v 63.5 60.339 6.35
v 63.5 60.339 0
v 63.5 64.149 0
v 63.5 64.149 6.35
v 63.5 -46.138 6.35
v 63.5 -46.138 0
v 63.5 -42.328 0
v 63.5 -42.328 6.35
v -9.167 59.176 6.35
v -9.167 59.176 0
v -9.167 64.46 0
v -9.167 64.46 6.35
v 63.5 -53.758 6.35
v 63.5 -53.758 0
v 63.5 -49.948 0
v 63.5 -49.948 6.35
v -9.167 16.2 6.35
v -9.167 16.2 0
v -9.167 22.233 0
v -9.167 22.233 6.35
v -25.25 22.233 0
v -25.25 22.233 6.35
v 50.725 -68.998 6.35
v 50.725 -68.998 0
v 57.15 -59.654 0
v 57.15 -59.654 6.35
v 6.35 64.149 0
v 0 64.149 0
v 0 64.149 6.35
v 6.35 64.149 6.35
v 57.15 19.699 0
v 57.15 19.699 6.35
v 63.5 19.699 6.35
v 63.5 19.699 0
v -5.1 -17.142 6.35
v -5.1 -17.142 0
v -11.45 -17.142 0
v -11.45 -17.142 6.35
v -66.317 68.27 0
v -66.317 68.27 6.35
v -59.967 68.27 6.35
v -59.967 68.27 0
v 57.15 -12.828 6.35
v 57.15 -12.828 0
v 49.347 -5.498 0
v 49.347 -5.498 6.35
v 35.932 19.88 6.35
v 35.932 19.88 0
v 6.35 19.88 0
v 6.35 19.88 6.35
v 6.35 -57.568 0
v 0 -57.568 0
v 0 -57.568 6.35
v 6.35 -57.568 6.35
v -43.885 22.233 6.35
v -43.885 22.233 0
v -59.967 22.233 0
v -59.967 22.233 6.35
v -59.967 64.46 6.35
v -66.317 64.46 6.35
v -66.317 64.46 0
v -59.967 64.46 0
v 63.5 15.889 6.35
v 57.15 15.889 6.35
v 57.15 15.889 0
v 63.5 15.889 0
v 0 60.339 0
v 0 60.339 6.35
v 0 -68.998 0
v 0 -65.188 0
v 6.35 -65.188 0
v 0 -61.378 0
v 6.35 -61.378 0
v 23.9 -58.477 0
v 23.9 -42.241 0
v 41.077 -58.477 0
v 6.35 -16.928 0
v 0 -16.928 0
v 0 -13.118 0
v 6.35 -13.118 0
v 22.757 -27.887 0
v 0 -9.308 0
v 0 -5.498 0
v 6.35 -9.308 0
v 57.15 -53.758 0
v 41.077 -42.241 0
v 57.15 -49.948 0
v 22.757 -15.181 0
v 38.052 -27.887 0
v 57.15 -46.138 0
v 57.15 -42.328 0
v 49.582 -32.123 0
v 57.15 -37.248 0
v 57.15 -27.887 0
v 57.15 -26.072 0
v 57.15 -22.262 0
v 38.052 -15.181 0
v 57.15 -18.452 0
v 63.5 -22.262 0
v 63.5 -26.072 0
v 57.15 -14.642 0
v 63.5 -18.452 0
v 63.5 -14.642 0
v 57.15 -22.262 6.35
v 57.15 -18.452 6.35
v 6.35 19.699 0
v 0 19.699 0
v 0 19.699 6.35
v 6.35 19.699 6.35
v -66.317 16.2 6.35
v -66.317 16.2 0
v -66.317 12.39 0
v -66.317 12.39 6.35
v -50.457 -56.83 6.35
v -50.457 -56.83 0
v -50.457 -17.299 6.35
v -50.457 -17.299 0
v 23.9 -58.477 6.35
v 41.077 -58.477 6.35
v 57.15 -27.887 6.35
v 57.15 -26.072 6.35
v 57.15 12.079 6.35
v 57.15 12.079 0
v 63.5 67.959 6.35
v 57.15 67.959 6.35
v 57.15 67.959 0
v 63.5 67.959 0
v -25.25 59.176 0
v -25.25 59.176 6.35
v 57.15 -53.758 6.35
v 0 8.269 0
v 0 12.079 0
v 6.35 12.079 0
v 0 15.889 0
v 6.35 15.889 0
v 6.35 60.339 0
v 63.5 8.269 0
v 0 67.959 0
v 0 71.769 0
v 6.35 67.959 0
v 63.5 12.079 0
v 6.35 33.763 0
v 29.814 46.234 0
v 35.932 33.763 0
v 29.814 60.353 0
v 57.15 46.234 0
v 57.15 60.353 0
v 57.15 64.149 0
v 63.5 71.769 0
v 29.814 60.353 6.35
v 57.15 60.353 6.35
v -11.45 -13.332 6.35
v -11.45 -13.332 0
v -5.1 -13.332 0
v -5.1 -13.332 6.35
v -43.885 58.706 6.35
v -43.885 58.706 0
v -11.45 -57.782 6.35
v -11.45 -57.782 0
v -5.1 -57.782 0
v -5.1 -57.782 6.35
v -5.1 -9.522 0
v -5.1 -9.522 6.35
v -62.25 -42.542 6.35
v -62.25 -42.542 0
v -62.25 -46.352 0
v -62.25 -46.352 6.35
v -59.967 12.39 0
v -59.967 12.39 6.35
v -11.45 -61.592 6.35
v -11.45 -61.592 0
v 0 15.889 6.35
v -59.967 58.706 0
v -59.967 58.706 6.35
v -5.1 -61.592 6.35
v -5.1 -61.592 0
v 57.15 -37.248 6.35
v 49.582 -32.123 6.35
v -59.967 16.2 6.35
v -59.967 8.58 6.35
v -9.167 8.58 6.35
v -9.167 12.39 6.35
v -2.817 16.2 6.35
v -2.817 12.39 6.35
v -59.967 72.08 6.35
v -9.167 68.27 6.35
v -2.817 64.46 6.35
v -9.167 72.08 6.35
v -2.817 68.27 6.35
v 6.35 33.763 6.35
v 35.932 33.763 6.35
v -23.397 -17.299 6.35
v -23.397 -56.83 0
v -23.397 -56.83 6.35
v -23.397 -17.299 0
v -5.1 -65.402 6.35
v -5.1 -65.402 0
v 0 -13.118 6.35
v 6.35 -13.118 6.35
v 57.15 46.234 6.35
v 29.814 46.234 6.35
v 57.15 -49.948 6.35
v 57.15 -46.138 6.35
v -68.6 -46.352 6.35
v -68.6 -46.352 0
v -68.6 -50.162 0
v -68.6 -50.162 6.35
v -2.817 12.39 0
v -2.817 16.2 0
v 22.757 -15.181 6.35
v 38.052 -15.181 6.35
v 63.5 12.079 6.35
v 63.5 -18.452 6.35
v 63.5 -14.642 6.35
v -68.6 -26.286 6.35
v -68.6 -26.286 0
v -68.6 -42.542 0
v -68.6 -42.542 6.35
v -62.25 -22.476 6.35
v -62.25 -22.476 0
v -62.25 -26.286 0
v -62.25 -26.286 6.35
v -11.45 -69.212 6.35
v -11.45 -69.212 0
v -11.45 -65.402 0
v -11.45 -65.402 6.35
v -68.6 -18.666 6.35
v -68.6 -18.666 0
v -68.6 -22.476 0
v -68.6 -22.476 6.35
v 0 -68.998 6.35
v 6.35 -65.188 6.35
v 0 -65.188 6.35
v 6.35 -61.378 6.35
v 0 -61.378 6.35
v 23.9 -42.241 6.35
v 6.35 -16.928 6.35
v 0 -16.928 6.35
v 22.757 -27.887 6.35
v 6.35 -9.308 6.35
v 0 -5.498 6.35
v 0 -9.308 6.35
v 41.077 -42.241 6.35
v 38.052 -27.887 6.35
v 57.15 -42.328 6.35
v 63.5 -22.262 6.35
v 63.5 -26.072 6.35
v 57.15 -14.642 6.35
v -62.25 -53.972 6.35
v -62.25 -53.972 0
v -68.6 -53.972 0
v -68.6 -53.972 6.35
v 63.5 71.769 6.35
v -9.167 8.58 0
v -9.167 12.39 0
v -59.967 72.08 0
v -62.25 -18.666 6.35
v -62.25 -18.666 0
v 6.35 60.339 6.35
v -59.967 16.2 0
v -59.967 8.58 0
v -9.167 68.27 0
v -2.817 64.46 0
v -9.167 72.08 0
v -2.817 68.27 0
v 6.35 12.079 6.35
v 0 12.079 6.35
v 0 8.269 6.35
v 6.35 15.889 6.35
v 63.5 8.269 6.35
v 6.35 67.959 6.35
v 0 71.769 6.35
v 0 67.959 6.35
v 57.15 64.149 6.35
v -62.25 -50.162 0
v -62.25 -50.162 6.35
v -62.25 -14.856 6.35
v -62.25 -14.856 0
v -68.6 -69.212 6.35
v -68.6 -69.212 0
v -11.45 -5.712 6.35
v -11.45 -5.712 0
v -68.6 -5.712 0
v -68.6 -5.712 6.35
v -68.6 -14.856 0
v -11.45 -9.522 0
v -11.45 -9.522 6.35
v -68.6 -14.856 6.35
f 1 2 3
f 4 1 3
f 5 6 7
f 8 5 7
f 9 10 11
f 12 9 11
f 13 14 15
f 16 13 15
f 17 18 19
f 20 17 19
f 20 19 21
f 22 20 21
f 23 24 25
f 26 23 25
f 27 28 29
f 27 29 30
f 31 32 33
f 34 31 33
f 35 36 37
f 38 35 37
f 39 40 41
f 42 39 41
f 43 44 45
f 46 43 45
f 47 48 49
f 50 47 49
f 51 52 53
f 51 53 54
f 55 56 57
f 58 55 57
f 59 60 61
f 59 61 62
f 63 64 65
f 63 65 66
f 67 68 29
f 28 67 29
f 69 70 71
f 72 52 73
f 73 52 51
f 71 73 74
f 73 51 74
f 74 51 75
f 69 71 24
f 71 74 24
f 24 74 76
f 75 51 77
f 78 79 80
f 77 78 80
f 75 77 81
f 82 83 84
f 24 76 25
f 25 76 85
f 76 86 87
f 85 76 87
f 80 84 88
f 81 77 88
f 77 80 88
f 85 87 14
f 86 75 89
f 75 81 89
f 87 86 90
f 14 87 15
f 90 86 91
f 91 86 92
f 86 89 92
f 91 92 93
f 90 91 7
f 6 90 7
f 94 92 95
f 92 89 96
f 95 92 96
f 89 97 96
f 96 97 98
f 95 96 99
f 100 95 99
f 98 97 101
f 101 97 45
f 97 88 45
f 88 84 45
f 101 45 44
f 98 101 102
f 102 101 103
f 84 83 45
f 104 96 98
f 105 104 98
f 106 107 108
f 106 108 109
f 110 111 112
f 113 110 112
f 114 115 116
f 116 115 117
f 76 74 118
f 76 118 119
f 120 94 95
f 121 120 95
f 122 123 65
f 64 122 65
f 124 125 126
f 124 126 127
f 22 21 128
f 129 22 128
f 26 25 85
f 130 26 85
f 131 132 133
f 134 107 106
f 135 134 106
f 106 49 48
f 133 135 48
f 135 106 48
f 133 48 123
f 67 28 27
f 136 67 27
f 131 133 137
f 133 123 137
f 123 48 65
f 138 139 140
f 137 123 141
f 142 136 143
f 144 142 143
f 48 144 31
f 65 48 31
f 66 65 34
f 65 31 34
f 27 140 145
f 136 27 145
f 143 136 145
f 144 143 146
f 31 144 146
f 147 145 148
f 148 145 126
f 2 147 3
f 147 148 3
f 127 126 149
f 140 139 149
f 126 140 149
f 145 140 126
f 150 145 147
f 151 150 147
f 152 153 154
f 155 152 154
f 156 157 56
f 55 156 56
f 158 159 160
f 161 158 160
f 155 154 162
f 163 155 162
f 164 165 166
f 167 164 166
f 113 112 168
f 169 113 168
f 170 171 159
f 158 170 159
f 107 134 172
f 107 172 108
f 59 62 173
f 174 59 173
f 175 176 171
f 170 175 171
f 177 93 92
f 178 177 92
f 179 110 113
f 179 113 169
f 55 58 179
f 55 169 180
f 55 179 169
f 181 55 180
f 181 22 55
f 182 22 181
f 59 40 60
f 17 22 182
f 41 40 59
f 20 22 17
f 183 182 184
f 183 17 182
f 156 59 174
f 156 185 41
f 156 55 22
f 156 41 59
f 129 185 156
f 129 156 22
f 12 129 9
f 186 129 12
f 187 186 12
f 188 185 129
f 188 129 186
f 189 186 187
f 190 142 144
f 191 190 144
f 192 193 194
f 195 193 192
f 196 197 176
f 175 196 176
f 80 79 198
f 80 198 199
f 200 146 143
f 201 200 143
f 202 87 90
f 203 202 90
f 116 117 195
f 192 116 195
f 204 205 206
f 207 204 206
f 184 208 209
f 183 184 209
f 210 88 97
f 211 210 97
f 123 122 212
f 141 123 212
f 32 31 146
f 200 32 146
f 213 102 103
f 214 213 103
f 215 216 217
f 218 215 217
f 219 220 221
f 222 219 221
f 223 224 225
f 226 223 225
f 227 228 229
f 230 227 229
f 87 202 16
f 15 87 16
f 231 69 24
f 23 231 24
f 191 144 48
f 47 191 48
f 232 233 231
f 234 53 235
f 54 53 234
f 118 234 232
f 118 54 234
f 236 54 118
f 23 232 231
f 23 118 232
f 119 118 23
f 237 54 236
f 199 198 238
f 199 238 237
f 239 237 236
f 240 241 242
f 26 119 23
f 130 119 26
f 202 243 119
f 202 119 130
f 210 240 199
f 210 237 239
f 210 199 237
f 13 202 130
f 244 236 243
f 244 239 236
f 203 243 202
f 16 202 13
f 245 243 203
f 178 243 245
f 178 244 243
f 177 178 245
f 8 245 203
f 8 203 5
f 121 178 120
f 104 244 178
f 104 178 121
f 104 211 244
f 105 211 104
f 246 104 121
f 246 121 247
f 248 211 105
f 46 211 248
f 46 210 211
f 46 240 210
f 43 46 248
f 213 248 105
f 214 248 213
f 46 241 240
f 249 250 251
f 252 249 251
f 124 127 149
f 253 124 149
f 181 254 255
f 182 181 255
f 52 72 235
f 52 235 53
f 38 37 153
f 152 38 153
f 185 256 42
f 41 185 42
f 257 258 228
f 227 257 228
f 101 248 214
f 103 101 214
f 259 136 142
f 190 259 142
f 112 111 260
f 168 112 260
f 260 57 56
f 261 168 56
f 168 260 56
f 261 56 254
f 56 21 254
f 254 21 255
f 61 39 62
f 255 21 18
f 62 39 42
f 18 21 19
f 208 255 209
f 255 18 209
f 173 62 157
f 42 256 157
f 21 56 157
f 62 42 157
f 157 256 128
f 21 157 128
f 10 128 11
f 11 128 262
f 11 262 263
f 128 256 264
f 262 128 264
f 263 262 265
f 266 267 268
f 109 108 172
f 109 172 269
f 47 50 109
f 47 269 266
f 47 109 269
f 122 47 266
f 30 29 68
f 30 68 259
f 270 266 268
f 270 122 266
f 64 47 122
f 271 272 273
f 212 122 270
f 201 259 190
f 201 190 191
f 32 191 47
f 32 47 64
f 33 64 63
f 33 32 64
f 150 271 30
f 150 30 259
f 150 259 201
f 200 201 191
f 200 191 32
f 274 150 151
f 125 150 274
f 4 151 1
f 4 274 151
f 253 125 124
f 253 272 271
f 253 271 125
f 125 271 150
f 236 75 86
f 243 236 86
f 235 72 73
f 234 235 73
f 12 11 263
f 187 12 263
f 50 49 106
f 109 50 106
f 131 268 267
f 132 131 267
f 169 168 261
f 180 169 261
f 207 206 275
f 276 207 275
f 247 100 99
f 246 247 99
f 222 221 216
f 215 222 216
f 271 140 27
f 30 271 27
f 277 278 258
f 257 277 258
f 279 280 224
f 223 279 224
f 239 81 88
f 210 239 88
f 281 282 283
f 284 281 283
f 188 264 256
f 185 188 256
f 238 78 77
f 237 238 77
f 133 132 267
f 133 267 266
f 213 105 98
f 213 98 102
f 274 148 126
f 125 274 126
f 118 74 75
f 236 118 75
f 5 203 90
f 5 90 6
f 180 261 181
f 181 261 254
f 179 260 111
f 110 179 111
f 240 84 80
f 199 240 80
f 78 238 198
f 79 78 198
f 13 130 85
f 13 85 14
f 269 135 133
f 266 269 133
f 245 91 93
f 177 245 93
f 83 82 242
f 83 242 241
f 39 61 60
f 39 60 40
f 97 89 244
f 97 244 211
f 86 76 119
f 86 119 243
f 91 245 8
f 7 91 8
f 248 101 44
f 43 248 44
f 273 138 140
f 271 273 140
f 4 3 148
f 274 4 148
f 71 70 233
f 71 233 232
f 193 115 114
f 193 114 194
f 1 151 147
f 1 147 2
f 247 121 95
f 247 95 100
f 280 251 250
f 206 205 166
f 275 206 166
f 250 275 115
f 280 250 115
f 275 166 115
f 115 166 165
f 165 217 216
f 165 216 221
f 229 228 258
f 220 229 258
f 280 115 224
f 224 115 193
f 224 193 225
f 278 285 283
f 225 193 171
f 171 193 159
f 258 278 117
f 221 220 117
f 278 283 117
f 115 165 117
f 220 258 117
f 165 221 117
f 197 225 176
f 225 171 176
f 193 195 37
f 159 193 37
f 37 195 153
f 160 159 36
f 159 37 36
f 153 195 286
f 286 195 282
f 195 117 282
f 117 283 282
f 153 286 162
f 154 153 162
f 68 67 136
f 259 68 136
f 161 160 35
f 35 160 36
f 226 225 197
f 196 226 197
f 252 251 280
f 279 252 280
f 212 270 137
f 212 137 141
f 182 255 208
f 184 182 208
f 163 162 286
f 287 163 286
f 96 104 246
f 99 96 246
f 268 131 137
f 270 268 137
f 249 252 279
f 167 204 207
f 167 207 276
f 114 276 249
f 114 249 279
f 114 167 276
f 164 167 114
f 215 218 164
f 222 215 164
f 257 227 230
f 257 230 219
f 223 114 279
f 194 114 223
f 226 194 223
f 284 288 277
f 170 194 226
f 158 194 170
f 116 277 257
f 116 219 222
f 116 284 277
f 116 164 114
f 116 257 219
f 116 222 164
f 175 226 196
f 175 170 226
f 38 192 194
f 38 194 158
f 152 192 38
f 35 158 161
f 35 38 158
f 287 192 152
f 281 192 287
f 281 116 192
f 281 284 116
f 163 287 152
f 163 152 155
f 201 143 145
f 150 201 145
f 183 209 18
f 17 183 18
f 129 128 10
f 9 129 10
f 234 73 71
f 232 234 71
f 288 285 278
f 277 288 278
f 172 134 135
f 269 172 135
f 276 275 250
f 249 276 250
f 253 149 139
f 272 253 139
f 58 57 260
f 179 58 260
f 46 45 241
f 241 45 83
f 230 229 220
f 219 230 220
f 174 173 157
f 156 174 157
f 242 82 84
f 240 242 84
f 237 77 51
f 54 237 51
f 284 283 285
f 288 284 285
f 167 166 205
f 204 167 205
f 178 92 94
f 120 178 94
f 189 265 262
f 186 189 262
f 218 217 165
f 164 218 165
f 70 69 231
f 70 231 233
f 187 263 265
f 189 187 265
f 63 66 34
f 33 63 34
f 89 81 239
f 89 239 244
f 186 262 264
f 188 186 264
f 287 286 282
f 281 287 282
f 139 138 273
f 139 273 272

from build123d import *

# Parameters (mm, degrees)
F0_W     = 6.35
F0_H     = 3.81
F4_DEPTH = 6.35
F3_W     = 17.177414149
F3_H     = 16.2361897528
F3_W_2   = 15.2949504554
F3_H_2   = 12.7065815032
F3_W_3   = 6.35
F3_H_3   = 3.81
F5_DEPTH = 6.35
F1_W     = 6.35
F1_H     = 3.81
F6_DEPTH = 6.35
F2_W     = 27.0603150129
F2_H     = 39.5315941423
F7_DEPTH = 6.35


# Not quite as in the source:
# - a feature names something its author has since deleted; it is built from what else it names


with BuildPart() as f4:
    # F0 (on Top) → F4 (new body)
    with BuildSketch(Plane.XY):
        Polygon((57.15, 71.7689129657), (6.35, 71.7689129657), (6.35, 67.9589129657), (6.35, 64.1489129657), (6.35, 60.3389129657), (6.35, 33.7630063295), (35.9322190344, 33.7630063295), (35.9322190344, 19.8798868805), (6.35, 19.8798868805), (6.35, 19.6989129657), (6.35, 15.8889129657), (6.35, 12.0789129657), (6.35, 8.2689129657), (57.15, 8.2689129657), (57.15, 12.0789129657), (57.15, 15.8889129657), (57.15, 19.6989129657), (57.15, 46.2342835963), (29.8142325193, 46.2342835963), (29.8142325193, 60.3527091444), (57.15, 60.3527091444), (57.15, 64.1489129657), (57.15, 67.9589129657), align=None)
        with Locations((3.175, 69.8639129657)):
            Rectangle(F0_W, F0_H)
        with Locations((3.175, 62.2439129657)):
            Rectangle(F0_W, F0_H)
        with Locations((3.175, 17.7939129657)):
            Rectangle(F0_W, F0_H)
        with Locations((3.175, 10.1739129657)):
            Rectangle(F0_W, F0_H)
        with Locations((60.325, 69.8639129657)):
            Rectangle(F0_W, F0_H)
        Polygon((63.499985013, 64.1489129657), (57.15, 64.1489129657), (57.15, 60.3527091444), (63.499985013, 60.3389129657), align=None)
        with Locations((60.325, 17.7939129657)):
            Rectangle(F0_W, F0_H)
        with Locations((60.325, 10.1739129657)):
            Rectangle(F0_W, F0_H)
    extrude(amount=F4_DEPTH)


with BuildPart() as f5:
    # F3 (on Top) → F5 (new body)
    with BuildSketch(Plane.XY):
        Polygon((49.34674353, -5.4983740449), (6.35, -5.4983740449), (6.35, -9.3083740449), (6.35, -13.1183740449), (6.35, -16.9283740449), (6.35, -57.5683740449), (6.35, -61.3783740449), (6.35, -65.1883740449), (6.35, -68.9983740449), (50.7249496877, -68.9983740449), (57.15, -59.6539080143), (57.15, -53.7583740449), (57.15, -49.9483740449), (57.15, -46.1383740449), (57.15, -42.3283740449), (57.15, -37.2483740449), (49.582055217, -32.122977078), (57.15, -27.8874486685), (57.15, -26.0723740449), (57.15, -22.2623740449), (57.15, -18.4523740449), (57.15, -14.6423740449), (57.15, -12.8277968615), align=None)
        with Locations((32.488649711, -50.3592770547)):
            Rectangle(F3_W, F3_H, mode=Mode.SUBTRACT)
        with Locations((30.4045233935, -21.5341579169)):
            Rectangle(F3_W_2, F3_H_2, mode=Mode.SUBTRACT)
        with Locations((3.175, -7.4033740449)):
            Rectangle(F3_W_3, F3_H_3)
        with Locations((3.175, -15.0233740449)):
            Rectangle(F3_W_3, F3_H_3)
        with Locations((3.175, -59.4733740449)):
            Rectangle(F3_W_3, F3_H_3)
        with Locations((3.175, -67.0933740449)):
            Rectangle(F3_W_3, F3_H_3)
        with Locations((60.325, -16.5473740449)):
            Rectangle(F3_W_3, F3_H_3)
        with Locations((60.325, -24.1673740449)):
            Rectangle(F3_W_3, F3_H_3)
        with Locations((60.325, -44.2333740449)):
            Rectangle(F3_W_3, F3_H_3)
        with Locations((60.325, -51.8533740449)):
            Rectangle(F3_W_3, F3_H_3)
    extrude(amount=F5_DEPTH)


with BuildPart() as f6:
    # F1 (on Top) → F6 (new body)
    with BuildSketch(Plane.XY):
        with Locations((-63.1423869252, 66.3646499625)):
            Rectangle(F1_W, F1_H)
        Polygon((-9.1673869252, 72.0796499625), (-59.9673869252, 72.0796499625), (-59.9673869252, 68.2696499625), (-59.9673869252, 64.4596499625), (-59.9673869252, 60.6496499625), (-59.9673869252, 58.705560863), (-43.8845783249, 58.705560863), (-43.8845783249, 22.232959047), (-59.9673869252, 22.232959047), (-59.9673869252, 20.0096499625), (-59.9673869252, 16.1996499625), (-66.3173869252, 16.1996499625), (-66.3173869252, 12.3896499625), (-59.9673869252, 12.3896499625), (-59.9673869252, 8.5796499625), (-9.1673869252, 8.5796499625), (-9.1673869252, 12.3896499625), (-2.8173869252, 12.3896499625), (-2.8173869252, 16.1996499625), (-9.1673869252, 16.1996499625), (-9.1673869252, 20.0096499625), (-9.1673869252, 22.232959047), (-25.2501843252, 22.232959047), (-25.2501843252, 59.1761693358), (-9.1673869252, 59.1761693358), (-9.1673869252, 60.6496499625), (-9.1673869252, 64.4596499625), (-2.8173869252, 64.4596499625), (-2.8173869252, 68.2696499625), (-9.1673869252, 68.2696499625), align=None)
    extrude(amount=F6_DEPTH)


with BuildPart() as f7:
    # F2 (on Top) → F7 (new body)
    with BuildSketch(Plane.XY):
        Polygon((-11.4495668173, -5.7117735744), (-68.5995668173, -5.7117735744), (-68.5995668173, -14.8557735744), (-62.2495668173, -14.8557735744), (-62.2495668173, -18.6657735744), (-68.5995668173, -18.6657735744), (-68.5995668173, -22.4757735744), (-62.2495668173, -22.4757735744), (-62.2495668173, -26.2857735744), (-68.5995668173, -26.2857735744), (-68.5995668173, -42.5417735744), (-62.2495668173, -42.5417735744), (-62.2495668173, -46.3517735744), (-68.5995668173, -46.3517735744), (-68.5995668173, -50.1617735744), (-62.2495668173, -50.1617735744), (-62.2495668173, -53.9717735744), (-68.5995668173, -53.9717735744), (-68.5995668173, -69.2117735744), (-11.4495668173, -69.2117735744), (-11.4495668173, -65.4017735744), (-5.0995668173, -65.4017735744), (-5.0995668173, -61.5917735744), (-11.4495668173, -61.5917735744), (-11.4495668173, -57.7817735744), (-5.0995668173, -57.7817735744), (-5.0995668173, -17.1417735744), (-11.4495668173, -17.1417735744), (-11.4495668173, -13.3317735744), (-5.0995668173, -13.3317735744), (-5.0995668173, -9.5217735744), (-11.4495668173, -9.5217735744), align=None)
        with Locations((-36.9269400835, -37.0644265786)):
            Rectangle(F2_W, F2_H, mode=Mode.SUBTRACT)
    extrude(amount=F7_DEPTH)


solid = Compound([f4.part, f5.part, f6.part, f7.part])
